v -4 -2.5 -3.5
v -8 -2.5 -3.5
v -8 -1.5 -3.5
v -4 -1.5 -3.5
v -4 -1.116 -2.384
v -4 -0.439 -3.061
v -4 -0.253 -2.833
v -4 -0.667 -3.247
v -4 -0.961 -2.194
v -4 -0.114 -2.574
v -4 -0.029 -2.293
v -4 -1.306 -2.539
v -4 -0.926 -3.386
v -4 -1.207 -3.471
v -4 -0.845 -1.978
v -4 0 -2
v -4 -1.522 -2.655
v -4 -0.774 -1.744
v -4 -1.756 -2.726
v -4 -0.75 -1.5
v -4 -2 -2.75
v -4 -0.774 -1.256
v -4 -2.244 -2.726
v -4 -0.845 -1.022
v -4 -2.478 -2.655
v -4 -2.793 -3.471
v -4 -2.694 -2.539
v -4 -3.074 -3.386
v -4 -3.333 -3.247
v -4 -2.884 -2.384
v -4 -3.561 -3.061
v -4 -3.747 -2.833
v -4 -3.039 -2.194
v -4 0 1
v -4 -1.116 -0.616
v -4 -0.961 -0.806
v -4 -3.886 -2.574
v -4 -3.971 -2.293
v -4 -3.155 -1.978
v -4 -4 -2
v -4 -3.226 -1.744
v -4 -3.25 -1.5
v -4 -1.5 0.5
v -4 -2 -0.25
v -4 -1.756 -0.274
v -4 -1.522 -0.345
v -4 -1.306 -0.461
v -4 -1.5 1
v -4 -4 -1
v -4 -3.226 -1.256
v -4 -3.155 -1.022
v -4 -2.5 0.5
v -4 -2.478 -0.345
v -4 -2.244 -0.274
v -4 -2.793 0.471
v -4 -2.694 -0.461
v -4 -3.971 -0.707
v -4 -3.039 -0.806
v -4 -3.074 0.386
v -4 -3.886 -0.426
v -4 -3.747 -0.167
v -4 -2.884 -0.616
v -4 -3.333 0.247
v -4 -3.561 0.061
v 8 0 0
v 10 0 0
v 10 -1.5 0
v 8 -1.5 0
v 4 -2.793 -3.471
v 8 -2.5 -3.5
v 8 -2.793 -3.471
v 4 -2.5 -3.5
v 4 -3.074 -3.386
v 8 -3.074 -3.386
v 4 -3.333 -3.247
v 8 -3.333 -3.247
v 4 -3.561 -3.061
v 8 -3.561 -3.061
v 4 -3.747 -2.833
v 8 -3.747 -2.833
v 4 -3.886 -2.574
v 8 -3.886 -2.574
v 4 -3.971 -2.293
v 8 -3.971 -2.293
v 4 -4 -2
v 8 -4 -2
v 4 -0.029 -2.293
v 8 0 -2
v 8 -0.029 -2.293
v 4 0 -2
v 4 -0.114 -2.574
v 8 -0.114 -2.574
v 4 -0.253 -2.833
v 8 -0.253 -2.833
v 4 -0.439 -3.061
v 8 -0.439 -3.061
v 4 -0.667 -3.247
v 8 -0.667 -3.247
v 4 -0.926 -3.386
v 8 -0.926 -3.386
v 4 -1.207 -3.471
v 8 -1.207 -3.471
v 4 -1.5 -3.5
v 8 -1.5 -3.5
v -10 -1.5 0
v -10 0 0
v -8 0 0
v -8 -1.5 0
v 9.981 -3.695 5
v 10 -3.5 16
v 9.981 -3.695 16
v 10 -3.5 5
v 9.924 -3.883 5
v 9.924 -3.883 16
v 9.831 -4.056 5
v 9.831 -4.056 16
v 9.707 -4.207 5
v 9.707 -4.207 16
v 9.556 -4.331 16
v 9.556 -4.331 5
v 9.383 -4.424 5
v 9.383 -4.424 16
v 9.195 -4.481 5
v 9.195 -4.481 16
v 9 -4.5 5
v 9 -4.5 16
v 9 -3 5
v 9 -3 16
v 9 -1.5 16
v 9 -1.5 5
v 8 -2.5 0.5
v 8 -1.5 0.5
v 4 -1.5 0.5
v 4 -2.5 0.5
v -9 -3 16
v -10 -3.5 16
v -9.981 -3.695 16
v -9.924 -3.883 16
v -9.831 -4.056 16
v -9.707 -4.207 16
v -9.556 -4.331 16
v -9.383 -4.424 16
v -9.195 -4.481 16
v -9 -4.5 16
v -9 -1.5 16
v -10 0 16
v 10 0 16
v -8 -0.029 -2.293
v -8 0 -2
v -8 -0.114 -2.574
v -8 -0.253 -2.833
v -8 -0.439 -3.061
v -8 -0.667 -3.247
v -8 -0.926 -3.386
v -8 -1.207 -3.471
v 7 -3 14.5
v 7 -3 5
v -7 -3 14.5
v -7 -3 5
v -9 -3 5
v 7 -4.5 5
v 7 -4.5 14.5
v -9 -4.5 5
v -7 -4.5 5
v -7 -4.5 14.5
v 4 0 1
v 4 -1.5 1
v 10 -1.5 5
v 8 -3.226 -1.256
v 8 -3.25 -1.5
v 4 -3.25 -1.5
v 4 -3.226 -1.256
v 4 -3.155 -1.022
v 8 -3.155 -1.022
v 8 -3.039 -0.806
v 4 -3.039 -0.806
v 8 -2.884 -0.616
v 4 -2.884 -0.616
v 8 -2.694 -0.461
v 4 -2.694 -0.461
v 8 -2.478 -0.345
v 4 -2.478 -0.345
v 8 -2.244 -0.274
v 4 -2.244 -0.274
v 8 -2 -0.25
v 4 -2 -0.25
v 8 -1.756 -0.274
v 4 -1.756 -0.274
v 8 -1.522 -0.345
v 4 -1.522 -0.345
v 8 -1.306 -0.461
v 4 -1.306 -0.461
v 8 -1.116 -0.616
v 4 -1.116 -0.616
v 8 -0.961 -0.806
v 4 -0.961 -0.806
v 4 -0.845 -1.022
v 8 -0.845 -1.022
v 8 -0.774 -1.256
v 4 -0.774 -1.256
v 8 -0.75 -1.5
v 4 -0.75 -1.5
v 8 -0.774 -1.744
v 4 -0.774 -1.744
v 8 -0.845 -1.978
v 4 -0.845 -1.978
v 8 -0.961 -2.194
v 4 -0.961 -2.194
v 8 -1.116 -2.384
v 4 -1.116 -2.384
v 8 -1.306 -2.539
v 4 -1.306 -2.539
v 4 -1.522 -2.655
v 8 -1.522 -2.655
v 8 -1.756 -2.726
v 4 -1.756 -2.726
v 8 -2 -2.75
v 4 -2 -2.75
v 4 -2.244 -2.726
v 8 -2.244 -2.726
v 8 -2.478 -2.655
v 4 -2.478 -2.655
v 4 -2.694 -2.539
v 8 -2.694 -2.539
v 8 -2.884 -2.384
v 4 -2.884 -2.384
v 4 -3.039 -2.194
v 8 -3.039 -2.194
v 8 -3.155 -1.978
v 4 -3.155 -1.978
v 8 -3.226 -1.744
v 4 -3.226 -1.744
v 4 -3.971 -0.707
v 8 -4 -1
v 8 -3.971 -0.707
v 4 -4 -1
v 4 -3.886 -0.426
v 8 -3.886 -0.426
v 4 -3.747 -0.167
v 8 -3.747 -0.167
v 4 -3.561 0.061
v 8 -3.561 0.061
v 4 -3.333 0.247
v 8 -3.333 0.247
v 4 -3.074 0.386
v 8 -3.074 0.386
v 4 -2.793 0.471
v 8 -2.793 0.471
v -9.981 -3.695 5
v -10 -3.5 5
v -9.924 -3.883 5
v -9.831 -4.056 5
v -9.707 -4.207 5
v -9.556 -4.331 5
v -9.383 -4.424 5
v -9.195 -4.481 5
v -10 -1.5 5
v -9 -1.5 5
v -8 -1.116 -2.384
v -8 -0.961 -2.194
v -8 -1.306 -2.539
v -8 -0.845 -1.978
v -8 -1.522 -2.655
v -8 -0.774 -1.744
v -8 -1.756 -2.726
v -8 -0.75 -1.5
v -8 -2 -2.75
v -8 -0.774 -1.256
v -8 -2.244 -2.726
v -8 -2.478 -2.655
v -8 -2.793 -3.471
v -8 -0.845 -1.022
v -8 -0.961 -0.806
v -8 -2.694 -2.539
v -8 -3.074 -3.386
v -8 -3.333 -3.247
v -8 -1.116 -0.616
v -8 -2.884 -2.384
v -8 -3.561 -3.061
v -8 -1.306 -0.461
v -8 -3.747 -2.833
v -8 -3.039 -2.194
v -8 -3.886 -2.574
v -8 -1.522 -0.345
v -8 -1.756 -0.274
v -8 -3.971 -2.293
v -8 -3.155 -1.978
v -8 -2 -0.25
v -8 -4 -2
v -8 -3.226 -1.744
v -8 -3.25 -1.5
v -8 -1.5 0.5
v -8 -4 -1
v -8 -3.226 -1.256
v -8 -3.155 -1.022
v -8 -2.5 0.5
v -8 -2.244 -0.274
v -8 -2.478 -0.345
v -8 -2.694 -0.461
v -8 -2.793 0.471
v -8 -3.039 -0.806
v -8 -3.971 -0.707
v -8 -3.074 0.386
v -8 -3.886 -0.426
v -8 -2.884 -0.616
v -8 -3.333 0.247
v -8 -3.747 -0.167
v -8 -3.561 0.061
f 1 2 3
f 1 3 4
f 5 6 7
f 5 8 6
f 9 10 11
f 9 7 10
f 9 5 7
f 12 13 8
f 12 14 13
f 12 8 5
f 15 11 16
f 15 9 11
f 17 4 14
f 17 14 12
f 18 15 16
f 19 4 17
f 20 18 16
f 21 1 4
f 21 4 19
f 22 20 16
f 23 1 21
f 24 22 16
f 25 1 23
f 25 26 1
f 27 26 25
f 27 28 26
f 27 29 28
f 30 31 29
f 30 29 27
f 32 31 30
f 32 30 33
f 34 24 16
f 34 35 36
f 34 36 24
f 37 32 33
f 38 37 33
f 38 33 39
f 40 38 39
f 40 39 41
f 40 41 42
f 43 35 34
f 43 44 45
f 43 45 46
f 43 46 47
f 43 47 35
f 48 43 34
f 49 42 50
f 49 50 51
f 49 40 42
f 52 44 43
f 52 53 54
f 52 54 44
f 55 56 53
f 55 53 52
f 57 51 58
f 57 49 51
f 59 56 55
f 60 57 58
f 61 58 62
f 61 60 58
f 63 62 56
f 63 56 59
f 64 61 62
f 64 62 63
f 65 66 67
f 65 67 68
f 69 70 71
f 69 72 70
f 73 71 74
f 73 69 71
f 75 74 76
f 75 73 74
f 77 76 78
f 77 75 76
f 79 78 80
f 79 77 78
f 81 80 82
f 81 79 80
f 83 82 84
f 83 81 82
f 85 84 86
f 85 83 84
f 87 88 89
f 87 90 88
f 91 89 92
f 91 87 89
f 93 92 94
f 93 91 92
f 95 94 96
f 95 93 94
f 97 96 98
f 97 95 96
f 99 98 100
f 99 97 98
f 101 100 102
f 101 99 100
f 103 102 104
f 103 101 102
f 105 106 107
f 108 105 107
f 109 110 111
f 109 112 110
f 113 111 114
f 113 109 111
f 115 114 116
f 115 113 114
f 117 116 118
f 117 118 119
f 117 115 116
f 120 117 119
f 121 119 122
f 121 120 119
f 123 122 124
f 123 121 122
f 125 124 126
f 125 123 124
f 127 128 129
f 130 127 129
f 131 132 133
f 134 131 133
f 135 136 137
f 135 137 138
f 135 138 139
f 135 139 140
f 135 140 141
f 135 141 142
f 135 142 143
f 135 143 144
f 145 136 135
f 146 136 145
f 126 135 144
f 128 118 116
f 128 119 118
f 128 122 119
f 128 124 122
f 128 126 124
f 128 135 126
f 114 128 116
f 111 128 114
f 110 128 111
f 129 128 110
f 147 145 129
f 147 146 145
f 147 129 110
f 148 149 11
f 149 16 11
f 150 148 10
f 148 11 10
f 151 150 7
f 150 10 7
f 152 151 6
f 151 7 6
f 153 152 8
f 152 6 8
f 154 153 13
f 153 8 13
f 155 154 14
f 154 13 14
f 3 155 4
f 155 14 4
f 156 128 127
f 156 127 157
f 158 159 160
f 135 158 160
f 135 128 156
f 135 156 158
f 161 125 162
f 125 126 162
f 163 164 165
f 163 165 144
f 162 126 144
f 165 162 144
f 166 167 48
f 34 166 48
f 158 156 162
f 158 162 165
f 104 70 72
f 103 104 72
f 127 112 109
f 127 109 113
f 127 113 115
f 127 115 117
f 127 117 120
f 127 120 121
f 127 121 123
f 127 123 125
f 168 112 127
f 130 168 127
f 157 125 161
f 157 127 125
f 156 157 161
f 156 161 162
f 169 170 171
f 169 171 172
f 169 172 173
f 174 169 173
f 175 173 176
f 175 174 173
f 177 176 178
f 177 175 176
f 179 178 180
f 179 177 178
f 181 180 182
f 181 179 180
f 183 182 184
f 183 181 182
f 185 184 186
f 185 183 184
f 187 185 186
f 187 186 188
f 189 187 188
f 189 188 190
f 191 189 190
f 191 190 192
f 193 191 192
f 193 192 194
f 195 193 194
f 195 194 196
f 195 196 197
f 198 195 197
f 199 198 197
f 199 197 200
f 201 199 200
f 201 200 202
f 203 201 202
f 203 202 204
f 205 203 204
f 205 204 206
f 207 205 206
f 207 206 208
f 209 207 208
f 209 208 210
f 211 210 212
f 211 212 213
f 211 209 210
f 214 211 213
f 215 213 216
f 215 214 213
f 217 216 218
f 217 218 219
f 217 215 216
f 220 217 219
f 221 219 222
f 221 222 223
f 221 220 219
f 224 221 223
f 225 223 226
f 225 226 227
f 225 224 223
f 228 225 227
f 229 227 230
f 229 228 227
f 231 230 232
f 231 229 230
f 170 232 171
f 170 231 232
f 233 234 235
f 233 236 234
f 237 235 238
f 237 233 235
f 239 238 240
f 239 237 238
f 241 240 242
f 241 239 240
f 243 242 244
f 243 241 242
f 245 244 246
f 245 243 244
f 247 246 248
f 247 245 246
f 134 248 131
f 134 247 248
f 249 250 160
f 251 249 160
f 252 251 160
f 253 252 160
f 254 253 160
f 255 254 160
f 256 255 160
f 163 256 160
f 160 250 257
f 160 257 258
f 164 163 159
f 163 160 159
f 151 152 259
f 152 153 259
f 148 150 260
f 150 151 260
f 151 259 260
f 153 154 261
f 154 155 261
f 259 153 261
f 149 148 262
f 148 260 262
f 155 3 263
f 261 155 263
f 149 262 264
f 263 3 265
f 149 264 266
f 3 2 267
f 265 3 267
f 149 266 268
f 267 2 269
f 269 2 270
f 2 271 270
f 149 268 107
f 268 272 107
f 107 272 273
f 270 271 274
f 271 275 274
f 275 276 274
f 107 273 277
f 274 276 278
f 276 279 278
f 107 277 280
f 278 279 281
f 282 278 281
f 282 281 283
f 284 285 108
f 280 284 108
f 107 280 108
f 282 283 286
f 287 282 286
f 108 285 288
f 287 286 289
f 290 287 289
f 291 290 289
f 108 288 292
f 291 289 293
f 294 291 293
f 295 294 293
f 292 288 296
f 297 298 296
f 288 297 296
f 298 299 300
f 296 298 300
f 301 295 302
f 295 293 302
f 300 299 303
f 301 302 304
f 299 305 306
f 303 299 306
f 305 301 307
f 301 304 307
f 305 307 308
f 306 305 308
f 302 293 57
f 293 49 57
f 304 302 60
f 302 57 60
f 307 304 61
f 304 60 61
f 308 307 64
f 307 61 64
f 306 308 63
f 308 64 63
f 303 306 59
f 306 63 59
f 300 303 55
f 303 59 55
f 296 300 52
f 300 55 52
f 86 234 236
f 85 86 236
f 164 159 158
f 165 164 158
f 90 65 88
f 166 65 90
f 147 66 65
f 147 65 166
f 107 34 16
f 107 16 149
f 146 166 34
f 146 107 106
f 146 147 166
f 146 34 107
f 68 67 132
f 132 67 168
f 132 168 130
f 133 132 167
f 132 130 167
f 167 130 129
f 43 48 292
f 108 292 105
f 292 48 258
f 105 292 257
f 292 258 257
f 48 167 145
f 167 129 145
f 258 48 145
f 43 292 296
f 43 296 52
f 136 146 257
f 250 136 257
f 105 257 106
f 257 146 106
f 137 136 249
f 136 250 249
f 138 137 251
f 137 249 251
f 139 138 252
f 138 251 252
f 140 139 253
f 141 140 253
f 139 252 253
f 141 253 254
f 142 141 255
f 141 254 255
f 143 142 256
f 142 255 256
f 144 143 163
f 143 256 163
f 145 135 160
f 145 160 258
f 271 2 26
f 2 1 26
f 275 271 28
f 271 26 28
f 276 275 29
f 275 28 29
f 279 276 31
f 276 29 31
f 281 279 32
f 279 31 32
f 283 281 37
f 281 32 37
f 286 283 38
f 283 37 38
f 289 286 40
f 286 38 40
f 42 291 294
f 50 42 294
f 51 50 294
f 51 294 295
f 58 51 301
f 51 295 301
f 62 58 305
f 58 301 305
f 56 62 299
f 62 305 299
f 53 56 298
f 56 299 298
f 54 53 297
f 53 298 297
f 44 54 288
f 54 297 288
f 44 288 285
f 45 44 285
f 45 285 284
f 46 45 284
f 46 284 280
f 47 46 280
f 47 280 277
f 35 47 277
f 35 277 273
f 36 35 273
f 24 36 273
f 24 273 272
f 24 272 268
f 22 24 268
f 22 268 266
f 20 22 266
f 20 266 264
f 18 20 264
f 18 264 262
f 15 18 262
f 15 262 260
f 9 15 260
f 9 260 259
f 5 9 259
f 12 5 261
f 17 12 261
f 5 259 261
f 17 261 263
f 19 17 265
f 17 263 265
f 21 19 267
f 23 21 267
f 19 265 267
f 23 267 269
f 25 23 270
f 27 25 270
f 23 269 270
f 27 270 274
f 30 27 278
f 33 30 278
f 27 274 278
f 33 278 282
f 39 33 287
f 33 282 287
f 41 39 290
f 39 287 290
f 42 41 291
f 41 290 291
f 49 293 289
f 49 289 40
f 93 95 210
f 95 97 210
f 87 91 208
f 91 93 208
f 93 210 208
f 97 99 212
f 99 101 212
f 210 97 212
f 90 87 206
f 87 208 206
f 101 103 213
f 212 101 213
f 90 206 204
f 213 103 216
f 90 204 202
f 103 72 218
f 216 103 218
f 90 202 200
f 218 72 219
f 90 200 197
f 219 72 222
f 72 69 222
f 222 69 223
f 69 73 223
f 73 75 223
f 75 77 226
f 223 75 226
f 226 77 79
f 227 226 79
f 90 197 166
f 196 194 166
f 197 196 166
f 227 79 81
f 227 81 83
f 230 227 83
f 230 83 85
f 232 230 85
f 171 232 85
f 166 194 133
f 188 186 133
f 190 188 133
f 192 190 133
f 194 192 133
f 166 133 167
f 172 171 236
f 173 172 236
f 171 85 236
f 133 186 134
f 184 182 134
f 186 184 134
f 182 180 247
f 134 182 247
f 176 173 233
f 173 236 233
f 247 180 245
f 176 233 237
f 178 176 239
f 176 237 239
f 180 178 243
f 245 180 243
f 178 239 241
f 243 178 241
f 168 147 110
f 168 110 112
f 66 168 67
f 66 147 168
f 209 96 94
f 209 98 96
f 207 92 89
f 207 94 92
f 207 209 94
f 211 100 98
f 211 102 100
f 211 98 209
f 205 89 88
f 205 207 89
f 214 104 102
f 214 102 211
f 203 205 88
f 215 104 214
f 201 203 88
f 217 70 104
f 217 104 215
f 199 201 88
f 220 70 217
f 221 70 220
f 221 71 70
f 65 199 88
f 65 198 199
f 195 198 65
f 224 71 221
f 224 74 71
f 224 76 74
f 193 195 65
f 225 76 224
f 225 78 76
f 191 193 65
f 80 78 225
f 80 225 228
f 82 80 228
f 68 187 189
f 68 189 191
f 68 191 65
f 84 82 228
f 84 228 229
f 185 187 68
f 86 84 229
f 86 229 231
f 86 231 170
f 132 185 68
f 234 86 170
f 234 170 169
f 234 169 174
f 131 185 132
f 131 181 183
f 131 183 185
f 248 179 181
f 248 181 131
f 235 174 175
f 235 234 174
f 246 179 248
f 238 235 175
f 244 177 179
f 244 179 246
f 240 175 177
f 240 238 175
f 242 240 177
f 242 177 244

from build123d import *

# Parameters (mm, degrees)
F0_W          = 10
F0_H          = 16
F1_DEPTH      = 1.5
F2_W          = 4
F2_H          = 4
F3_DEPTH      = 2.5
F3_DEPTH_BACK = 1.5
F4_R          = 1.5
F5_R          = 1.25
F6_DEPTH      = 8.001
F8_DEPTH      = 3
F10_R         = 1
F9_W          = 9
F9_H          = 1.5
F11_DEPTH     = 11.001
F12_W         = 4
F12_H         = 1
F13_DEPTH     = 1.5


with BuildPart() as f1:
    # F0 (on Front) → F1 (new body)
    with BuildSketch(Plane.XZ):
        with Locations((-5, 8)):
            Rectangle(F0_W, F0_H)
    extrude(amount=F1_DEPTH)

    # F2 (on face) → F3 (join, two sides)
    with BuildSketch(Plane.XZ.offset(1.5)) as f3_sk:
        with Locations((-6, -1.5)):
            Rectangle(F2_W, F2_H)
    extrude(amount=F3_DEPTH)
    extrude(f3_sk.sketch, amount=-F3_DEPTH_BACK)

    # F4
    f4_edges = [f1.edges().sort_by_distance(p)[0] for p in [
        (-6, 0, -3.5),
        (-6, -4, -3.5),
        (-6, -4, 0.5),
    ]]
    fillet(f4_edges, radius=F4_R)

    # F5 (on face) → F6 (cut, through all)
    with BuildSketch(Plane(origin=(-8, 0, 0), x_dir=(0, -1, 0), z_dir=(-1, 0, 0))):
        with Locations((2, -1.5)):
            Circle(F5_R)
    extrude(amount=-F6_DEPTH, mode=Mode.SUBTRACT)

    # F7 (on face) → F8 (join)
    with BuildSketch(Plane.XZ.offset(1.5)):
        Polygon((-10, 16), (-10, 5), (-7, 5), (-7, 14.5), (0, 14.5), (0, 16), align=None)
    extrude(amount=F8_DEPTH)

    # F10
    f10_edges = [f1.edges().sort_by_distance(p)[0] for p in [
        (-10, -4.5, 10.5),
    ]]
    fillet(f10_edges, radius=F10_R)

    # F9 (on face) → F11 (cut, through all)
    with BuildSketch(Plane.XY.offset(16)):
        with Locations((-4.5, -2.25)):
            Rectangle(F9_W, F9_H)
    extrude(amount=-F11_DEPTH, mode=Mode.SUBTRACT)

    # F12 (on face) → F13 (cut)
    with BuildSketch(Plane.XZ.offset(1.5)):
        with Locations((-2, 0.5)):
            Rectangle(F12_W, F12_H)
    extrude(amount=-F13_DEPTH, mode=Mode.SUBTRACT)

    # F14: F1 across plane


with BuildPart() as f1_1:
    add(f1.part)
    add(f1.part.mirror(Plane.YZ))


solid = f1_1.part
